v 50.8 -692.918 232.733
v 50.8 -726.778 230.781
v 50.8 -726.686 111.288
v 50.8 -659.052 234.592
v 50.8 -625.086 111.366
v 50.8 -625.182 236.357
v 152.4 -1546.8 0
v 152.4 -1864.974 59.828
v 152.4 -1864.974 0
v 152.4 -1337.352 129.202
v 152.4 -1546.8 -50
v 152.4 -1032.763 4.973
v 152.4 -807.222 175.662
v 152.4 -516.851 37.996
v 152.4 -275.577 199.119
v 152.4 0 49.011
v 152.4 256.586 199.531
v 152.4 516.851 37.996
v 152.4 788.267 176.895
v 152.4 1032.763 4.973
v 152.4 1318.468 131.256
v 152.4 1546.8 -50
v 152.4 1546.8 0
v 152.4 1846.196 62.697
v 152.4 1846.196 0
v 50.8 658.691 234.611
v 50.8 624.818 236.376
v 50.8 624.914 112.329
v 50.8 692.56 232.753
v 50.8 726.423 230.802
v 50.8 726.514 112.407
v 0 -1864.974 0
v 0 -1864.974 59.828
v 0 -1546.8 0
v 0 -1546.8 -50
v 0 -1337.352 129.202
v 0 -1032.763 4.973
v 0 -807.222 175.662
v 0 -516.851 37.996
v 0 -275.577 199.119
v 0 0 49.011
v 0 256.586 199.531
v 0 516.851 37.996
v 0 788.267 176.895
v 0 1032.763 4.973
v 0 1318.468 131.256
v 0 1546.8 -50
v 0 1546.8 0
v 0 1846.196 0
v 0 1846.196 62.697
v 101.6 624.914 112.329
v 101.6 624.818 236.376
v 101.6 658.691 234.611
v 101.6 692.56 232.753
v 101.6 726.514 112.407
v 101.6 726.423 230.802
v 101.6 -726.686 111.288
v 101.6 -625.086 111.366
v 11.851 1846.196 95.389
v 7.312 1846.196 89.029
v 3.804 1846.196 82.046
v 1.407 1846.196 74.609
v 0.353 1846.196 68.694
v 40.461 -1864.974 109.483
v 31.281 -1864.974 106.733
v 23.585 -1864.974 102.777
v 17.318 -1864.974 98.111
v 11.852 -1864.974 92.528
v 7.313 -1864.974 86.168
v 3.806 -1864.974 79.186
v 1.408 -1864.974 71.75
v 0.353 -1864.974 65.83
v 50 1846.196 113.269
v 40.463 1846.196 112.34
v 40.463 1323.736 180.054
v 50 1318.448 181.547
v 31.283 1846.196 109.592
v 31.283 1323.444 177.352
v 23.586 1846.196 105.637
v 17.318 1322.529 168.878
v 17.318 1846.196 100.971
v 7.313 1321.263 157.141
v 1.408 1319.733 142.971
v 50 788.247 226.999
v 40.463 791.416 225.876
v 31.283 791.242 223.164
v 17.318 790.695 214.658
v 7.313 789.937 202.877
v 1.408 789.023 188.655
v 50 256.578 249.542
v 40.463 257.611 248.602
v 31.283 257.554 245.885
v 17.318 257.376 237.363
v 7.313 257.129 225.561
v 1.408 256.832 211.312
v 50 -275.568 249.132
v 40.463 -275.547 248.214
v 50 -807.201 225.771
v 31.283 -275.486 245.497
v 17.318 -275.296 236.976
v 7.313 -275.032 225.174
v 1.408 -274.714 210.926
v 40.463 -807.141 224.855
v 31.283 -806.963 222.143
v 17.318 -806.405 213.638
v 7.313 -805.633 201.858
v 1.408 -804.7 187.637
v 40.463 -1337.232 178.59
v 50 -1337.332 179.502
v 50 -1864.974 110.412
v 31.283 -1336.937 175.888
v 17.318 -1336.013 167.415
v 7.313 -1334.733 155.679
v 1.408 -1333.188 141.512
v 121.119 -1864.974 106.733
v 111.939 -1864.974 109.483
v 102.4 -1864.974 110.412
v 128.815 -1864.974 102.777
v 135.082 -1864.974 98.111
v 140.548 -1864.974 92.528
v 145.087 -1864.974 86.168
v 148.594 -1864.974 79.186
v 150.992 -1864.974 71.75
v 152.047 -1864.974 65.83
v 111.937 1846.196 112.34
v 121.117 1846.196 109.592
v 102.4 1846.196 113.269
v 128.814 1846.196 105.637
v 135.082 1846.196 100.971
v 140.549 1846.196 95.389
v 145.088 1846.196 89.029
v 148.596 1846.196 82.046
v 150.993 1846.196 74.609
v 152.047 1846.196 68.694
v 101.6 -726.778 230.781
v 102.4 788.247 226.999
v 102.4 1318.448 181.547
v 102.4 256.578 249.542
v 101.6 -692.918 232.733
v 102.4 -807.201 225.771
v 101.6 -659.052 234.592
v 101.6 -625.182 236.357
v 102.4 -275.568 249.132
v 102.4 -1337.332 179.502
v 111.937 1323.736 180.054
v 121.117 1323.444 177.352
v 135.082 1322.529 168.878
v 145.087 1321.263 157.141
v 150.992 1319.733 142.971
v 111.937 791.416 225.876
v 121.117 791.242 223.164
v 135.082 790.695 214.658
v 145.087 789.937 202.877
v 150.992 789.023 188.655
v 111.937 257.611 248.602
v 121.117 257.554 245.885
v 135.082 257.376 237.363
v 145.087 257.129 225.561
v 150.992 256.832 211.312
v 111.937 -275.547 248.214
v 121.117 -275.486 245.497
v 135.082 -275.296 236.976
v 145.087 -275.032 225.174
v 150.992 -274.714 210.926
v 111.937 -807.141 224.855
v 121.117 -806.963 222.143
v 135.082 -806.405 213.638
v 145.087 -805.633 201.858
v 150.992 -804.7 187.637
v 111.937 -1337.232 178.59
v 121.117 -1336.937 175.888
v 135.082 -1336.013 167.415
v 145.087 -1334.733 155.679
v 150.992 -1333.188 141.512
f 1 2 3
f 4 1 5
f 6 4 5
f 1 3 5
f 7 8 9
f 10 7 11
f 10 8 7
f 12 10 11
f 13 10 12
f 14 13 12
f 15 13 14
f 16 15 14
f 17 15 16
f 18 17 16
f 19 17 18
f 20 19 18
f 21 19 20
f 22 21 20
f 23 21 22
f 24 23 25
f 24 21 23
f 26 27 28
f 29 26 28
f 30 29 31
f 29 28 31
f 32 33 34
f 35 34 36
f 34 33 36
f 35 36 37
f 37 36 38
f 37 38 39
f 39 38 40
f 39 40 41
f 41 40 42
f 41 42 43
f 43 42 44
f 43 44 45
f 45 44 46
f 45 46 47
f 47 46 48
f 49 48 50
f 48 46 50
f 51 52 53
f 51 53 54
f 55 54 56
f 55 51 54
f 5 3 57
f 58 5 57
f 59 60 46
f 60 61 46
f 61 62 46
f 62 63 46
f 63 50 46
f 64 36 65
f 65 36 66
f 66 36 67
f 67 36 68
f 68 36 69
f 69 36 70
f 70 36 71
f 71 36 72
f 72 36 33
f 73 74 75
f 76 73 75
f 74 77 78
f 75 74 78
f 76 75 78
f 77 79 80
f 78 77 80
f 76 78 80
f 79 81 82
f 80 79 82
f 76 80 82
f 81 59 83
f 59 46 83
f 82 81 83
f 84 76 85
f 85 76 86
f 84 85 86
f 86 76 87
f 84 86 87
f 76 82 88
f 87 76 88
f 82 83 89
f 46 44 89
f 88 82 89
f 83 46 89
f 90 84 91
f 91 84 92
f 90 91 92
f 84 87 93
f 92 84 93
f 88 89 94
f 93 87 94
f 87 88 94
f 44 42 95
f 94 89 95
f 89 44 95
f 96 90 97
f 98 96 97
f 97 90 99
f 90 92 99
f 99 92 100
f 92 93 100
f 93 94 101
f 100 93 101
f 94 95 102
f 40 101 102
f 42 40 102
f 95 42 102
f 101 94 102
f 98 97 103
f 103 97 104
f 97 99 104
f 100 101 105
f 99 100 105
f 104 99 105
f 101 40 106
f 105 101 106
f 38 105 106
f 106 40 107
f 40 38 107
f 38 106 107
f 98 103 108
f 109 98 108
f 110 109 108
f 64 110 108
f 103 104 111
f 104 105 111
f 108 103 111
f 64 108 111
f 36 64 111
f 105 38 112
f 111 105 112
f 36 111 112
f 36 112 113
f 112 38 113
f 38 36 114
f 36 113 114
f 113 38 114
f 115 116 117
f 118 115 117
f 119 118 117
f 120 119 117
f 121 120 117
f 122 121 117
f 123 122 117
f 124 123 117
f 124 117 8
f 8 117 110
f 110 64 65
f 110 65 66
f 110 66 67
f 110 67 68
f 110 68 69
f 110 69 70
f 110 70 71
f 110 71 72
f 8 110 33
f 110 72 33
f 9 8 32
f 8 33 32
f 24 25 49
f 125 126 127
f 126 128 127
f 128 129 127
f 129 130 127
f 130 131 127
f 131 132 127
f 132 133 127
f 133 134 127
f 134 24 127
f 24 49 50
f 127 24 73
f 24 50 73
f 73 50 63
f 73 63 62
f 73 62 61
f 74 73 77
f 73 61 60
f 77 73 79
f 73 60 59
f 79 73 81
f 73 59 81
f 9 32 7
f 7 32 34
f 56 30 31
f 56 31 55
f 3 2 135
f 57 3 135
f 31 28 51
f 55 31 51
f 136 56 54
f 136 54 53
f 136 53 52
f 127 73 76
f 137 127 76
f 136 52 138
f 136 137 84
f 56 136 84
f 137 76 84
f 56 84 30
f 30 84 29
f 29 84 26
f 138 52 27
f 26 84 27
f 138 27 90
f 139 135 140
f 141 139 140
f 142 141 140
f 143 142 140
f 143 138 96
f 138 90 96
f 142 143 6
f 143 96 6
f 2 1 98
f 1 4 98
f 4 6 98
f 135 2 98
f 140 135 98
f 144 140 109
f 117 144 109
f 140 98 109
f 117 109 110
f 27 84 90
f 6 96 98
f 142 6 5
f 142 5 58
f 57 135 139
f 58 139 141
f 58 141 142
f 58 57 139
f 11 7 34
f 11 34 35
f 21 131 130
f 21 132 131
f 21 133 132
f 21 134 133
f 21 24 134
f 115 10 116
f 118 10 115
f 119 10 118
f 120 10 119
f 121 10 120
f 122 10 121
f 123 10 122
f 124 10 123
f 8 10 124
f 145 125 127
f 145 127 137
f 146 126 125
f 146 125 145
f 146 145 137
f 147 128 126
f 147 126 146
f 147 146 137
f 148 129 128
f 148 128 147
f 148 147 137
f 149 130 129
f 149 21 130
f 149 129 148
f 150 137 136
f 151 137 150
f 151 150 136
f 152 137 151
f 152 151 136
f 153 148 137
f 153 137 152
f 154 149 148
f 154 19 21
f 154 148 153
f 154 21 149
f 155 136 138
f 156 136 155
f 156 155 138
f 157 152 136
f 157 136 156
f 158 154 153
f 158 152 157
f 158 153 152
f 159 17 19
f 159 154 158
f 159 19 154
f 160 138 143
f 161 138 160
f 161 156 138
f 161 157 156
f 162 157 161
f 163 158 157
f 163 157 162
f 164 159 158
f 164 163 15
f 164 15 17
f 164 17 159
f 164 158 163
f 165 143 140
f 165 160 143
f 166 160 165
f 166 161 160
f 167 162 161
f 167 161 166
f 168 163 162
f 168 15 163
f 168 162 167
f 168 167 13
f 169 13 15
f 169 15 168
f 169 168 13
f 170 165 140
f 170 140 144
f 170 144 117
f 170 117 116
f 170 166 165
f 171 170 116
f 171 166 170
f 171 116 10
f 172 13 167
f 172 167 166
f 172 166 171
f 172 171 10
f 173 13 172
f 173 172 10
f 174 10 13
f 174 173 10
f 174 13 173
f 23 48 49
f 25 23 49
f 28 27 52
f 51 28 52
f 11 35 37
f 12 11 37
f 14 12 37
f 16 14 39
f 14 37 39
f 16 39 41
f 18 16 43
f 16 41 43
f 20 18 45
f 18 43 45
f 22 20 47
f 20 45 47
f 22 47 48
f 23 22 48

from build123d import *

# Parameters (mm, degrees)
F1_DEPTH = 152.4
F2_R     = 50
F4_W     = 50.8
F4_H     = 101.6
F5_DEPTH = 152.4


with BuildPart() as f1:
    # F0 (on Right) → F1 (new body)
    with BuildSketch(Plane.YZ):
        with BuildLine():
            ThreePointArc((-1546.8, -50), (0, 49.0106103665), (1546.8, -50))
            Line((1546.8, -50), (1546.8, 0))
            Line((1546.8, 0), (1846.1961399702, 0))
            Line((1846.1961399702, 0), (1846.1961399702, 113.2689997187))
            ThreePointArc((1846.1961399702, 113.2689997187), (-9.4967662084, 252.2069546258), (-1864.9735382658, 110.4118005804))
            Line((-1864.9735382658, 110.4118005804), (-1864.9735382658, 0))
            Line((-1864.9735382658, 0), (-1546.8, 0))
            Line((-1546.8, 0), (-1546.8, -50))
        make_face()
    extrude(amount=F1_DEPTH)

    # F2
    f2_edges = [f1.edges().sort_by_distance(p)[0] for p in [
        (152.4, -9.496766, 252.206955),
        (0, -9.496766, 252.206955),
    ]]
    fillet(f2_edges, radius=F2_R)

    # F4 (on face) → F5 (cut)
    with BuildSketch(Plane(origin=(0, -0.086110522, 111.8475621363), x_dir=(1, 0, 0), z_dir=(0, -0.0007698916, 0.9999997036))):
        with Locations((76.2, -675.8)):
            Rectangle(F4_W, F4_H)
        with Locations((76.2, 675.8)):
            Rectangle(F4_W, F4_H)
    extrude(amount=F5_DEPTH, mode=Mode.SUBTRACT)


solid = f1.part
